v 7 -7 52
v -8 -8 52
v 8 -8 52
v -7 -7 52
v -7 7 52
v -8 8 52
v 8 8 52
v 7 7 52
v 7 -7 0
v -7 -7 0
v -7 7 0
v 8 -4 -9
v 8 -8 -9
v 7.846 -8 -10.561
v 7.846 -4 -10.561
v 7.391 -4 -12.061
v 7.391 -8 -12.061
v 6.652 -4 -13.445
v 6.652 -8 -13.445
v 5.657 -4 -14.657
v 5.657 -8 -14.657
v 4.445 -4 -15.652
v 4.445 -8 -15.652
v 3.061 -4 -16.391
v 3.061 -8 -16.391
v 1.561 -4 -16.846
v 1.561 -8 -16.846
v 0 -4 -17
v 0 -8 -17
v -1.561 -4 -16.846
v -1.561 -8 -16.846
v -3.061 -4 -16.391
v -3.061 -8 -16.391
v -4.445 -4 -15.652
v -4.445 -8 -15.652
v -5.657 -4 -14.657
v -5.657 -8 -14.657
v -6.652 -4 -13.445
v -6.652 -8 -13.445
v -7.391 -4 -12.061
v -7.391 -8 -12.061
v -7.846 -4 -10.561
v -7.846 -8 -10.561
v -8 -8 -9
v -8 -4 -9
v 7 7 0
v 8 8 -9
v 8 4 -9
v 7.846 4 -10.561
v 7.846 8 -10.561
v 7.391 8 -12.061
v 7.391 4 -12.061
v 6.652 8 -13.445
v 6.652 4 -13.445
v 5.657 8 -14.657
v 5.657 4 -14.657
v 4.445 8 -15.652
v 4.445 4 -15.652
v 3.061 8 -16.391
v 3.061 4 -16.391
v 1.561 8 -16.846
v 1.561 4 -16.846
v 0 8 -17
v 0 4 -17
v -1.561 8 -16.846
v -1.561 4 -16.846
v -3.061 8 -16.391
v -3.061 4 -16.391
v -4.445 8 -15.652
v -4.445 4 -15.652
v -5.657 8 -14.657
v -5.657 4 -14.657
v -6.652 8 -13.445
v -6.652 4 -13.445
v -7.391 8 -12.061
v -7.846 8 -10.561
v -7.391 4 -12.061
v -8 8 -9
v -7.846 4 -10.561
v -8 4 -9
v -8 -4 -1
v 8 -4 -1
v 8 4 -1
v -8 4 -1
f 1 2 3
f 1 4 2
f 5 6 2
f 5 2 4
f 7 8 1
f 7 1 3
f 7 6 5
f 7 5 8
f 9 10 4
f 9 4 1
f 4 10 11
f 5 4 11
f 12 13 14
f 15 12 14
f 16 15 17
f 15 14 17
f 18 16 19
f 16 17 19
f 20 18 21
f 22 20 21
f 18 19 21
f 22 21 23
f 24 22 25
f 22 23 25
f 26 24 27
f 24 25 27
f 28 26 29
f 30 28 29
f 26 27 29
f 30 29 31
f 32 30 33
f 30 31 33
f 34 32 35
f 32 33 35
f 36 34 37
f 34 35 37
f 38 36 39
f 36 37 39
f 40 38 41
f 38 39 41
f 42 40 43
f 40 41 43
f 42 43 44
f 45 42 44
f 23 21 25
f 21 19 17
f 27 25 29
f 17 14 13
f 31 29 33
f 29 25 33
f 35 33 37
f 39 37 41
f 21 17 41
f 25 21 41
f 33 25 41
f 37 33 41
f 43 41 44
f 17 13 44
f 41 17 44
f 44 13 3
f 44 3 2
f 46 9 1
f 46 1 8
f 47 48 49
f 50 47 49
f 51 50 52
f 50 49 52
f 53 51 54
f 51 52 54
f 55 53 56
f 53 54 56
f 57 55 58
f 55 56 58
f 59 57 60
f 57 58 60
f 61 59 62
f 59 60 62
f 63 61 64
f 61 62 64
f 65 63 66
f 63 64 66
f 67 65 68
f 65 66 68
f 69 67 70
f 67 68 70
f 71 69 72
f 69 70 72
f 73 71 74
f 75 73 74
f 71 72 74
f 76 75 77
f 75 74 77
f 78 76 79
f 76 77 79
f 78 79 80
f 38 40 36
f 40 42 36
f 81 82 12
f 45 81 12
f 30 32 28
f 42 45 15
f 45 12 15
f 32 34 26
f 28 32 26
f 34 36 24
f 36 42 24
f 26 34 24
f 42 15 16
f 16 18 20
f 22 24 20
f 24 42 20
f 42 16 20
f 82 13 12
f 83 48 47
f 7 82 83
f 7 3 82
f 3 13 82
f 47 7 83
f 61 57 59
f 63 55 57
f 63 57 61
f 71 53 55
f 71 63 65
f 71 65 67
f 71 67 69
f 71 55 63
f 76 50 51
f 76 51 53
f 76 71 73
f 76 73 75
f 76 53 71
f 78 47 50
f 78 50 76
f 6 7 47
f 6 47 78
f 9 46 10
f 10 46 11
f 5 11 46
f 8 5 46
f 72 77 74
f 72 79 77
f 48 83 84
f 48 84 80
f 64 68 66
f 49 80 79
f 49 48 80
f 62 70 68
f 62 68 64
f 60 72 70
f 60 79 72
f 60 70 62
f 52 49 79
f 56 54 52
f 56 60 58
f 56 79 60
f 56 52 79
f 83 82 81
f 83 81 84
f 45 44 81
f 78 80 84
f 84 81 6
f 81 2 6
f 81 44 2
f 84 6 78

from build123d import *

# Parameters (mm, degrees)
SKETCH_1_W          = 16
SKETCH_1_H          = 16
SKETCH_1_W_2        = 14
SKETCH_1_H_2        = 14
EXTRUDE_1_DEPTH     = 52
SKETCH_2_W          = 16
SKETCH_2_H          = 16
EXTRUDE_2_DEPTH     = 1
SKETCH_3_W          = 16
SKETCH_3_H          = 16
EXTRUDE_3_DEPTH     = 16
CUT_EXTRUDE_1_DEPTH = 16
SKETCH_5_W          = 16
SKETCH_5_H          = 8
CUT_EXTRUDE_2_DEPTH = 17


with BuildPart() as part:
    # 草图1 → 凸台-拉伸1 (new body)
    with BuildSketch(Plane.XY):
        Rectangle(SKETCH_1_W, SKETCH_1_H)
        Rectangle(SKETCH_1_W_2, SKETCH_1_H_2, mode=Mode.SUBTRACT)
    extrude(amount=EXTRUDE_1_DEPTH)

    # 草图2 → 凸台-拉伸2 (add)
    with BuildSketch(Plane(origin=(0, 0, 0), x_dir=(-1, 0, 0), z_dir=(0, 0, -1))):
        Rectangle(SKETCH_2_W, SKETCH_2_H)
    extrude(amount=EXTRUDE_2_DEPTH)

    # 草图3 → 凸台-拉伸3 (add)
    with BuildSketch(Plane(origin=(0, 0, -1), x_dir=(-1, 0, 0), z_dir=(0, 0, -1))):
        Rectangle(SKETCH_3_W, SKETCH_3_H)
    extrude(amount=EXTRUDE_3_DEPTH)

    # 草图4 → 切除-拉伸1 (cut)
    with BuildSketch(Plane.XZ.offset(8)):
        with BuildLine():
            Line((-8, -9), (-8, -21.563953952))
            Line((-8, -21.563953952), (8, -21.563953952))
            Line((8, -21.563953952), (8, -9))
            ThreePointArc((8, -9), (0, -17), (-8, -9))
        make_face()
    extrude(amount=-CUT_EXTRUDE_1_DEPTH, mode=Mode.SUBTRACT)

    # 草图5 → 切除-拉伸2 (cut, through all)
    with BuildSketch(Plane(origin=(8, 0, 0), x_dir=(0, 0, -1), z_dir=(1, 0, 0))):
        with Locations((9, 0)):
            Rectangle(SKETCH_5_W, SKETCH_5_H)
    extrude(amount=-CUT_EXTRUDE_2_DEPTH, mode=Mode.SUBTRACT)


solid = part.part
